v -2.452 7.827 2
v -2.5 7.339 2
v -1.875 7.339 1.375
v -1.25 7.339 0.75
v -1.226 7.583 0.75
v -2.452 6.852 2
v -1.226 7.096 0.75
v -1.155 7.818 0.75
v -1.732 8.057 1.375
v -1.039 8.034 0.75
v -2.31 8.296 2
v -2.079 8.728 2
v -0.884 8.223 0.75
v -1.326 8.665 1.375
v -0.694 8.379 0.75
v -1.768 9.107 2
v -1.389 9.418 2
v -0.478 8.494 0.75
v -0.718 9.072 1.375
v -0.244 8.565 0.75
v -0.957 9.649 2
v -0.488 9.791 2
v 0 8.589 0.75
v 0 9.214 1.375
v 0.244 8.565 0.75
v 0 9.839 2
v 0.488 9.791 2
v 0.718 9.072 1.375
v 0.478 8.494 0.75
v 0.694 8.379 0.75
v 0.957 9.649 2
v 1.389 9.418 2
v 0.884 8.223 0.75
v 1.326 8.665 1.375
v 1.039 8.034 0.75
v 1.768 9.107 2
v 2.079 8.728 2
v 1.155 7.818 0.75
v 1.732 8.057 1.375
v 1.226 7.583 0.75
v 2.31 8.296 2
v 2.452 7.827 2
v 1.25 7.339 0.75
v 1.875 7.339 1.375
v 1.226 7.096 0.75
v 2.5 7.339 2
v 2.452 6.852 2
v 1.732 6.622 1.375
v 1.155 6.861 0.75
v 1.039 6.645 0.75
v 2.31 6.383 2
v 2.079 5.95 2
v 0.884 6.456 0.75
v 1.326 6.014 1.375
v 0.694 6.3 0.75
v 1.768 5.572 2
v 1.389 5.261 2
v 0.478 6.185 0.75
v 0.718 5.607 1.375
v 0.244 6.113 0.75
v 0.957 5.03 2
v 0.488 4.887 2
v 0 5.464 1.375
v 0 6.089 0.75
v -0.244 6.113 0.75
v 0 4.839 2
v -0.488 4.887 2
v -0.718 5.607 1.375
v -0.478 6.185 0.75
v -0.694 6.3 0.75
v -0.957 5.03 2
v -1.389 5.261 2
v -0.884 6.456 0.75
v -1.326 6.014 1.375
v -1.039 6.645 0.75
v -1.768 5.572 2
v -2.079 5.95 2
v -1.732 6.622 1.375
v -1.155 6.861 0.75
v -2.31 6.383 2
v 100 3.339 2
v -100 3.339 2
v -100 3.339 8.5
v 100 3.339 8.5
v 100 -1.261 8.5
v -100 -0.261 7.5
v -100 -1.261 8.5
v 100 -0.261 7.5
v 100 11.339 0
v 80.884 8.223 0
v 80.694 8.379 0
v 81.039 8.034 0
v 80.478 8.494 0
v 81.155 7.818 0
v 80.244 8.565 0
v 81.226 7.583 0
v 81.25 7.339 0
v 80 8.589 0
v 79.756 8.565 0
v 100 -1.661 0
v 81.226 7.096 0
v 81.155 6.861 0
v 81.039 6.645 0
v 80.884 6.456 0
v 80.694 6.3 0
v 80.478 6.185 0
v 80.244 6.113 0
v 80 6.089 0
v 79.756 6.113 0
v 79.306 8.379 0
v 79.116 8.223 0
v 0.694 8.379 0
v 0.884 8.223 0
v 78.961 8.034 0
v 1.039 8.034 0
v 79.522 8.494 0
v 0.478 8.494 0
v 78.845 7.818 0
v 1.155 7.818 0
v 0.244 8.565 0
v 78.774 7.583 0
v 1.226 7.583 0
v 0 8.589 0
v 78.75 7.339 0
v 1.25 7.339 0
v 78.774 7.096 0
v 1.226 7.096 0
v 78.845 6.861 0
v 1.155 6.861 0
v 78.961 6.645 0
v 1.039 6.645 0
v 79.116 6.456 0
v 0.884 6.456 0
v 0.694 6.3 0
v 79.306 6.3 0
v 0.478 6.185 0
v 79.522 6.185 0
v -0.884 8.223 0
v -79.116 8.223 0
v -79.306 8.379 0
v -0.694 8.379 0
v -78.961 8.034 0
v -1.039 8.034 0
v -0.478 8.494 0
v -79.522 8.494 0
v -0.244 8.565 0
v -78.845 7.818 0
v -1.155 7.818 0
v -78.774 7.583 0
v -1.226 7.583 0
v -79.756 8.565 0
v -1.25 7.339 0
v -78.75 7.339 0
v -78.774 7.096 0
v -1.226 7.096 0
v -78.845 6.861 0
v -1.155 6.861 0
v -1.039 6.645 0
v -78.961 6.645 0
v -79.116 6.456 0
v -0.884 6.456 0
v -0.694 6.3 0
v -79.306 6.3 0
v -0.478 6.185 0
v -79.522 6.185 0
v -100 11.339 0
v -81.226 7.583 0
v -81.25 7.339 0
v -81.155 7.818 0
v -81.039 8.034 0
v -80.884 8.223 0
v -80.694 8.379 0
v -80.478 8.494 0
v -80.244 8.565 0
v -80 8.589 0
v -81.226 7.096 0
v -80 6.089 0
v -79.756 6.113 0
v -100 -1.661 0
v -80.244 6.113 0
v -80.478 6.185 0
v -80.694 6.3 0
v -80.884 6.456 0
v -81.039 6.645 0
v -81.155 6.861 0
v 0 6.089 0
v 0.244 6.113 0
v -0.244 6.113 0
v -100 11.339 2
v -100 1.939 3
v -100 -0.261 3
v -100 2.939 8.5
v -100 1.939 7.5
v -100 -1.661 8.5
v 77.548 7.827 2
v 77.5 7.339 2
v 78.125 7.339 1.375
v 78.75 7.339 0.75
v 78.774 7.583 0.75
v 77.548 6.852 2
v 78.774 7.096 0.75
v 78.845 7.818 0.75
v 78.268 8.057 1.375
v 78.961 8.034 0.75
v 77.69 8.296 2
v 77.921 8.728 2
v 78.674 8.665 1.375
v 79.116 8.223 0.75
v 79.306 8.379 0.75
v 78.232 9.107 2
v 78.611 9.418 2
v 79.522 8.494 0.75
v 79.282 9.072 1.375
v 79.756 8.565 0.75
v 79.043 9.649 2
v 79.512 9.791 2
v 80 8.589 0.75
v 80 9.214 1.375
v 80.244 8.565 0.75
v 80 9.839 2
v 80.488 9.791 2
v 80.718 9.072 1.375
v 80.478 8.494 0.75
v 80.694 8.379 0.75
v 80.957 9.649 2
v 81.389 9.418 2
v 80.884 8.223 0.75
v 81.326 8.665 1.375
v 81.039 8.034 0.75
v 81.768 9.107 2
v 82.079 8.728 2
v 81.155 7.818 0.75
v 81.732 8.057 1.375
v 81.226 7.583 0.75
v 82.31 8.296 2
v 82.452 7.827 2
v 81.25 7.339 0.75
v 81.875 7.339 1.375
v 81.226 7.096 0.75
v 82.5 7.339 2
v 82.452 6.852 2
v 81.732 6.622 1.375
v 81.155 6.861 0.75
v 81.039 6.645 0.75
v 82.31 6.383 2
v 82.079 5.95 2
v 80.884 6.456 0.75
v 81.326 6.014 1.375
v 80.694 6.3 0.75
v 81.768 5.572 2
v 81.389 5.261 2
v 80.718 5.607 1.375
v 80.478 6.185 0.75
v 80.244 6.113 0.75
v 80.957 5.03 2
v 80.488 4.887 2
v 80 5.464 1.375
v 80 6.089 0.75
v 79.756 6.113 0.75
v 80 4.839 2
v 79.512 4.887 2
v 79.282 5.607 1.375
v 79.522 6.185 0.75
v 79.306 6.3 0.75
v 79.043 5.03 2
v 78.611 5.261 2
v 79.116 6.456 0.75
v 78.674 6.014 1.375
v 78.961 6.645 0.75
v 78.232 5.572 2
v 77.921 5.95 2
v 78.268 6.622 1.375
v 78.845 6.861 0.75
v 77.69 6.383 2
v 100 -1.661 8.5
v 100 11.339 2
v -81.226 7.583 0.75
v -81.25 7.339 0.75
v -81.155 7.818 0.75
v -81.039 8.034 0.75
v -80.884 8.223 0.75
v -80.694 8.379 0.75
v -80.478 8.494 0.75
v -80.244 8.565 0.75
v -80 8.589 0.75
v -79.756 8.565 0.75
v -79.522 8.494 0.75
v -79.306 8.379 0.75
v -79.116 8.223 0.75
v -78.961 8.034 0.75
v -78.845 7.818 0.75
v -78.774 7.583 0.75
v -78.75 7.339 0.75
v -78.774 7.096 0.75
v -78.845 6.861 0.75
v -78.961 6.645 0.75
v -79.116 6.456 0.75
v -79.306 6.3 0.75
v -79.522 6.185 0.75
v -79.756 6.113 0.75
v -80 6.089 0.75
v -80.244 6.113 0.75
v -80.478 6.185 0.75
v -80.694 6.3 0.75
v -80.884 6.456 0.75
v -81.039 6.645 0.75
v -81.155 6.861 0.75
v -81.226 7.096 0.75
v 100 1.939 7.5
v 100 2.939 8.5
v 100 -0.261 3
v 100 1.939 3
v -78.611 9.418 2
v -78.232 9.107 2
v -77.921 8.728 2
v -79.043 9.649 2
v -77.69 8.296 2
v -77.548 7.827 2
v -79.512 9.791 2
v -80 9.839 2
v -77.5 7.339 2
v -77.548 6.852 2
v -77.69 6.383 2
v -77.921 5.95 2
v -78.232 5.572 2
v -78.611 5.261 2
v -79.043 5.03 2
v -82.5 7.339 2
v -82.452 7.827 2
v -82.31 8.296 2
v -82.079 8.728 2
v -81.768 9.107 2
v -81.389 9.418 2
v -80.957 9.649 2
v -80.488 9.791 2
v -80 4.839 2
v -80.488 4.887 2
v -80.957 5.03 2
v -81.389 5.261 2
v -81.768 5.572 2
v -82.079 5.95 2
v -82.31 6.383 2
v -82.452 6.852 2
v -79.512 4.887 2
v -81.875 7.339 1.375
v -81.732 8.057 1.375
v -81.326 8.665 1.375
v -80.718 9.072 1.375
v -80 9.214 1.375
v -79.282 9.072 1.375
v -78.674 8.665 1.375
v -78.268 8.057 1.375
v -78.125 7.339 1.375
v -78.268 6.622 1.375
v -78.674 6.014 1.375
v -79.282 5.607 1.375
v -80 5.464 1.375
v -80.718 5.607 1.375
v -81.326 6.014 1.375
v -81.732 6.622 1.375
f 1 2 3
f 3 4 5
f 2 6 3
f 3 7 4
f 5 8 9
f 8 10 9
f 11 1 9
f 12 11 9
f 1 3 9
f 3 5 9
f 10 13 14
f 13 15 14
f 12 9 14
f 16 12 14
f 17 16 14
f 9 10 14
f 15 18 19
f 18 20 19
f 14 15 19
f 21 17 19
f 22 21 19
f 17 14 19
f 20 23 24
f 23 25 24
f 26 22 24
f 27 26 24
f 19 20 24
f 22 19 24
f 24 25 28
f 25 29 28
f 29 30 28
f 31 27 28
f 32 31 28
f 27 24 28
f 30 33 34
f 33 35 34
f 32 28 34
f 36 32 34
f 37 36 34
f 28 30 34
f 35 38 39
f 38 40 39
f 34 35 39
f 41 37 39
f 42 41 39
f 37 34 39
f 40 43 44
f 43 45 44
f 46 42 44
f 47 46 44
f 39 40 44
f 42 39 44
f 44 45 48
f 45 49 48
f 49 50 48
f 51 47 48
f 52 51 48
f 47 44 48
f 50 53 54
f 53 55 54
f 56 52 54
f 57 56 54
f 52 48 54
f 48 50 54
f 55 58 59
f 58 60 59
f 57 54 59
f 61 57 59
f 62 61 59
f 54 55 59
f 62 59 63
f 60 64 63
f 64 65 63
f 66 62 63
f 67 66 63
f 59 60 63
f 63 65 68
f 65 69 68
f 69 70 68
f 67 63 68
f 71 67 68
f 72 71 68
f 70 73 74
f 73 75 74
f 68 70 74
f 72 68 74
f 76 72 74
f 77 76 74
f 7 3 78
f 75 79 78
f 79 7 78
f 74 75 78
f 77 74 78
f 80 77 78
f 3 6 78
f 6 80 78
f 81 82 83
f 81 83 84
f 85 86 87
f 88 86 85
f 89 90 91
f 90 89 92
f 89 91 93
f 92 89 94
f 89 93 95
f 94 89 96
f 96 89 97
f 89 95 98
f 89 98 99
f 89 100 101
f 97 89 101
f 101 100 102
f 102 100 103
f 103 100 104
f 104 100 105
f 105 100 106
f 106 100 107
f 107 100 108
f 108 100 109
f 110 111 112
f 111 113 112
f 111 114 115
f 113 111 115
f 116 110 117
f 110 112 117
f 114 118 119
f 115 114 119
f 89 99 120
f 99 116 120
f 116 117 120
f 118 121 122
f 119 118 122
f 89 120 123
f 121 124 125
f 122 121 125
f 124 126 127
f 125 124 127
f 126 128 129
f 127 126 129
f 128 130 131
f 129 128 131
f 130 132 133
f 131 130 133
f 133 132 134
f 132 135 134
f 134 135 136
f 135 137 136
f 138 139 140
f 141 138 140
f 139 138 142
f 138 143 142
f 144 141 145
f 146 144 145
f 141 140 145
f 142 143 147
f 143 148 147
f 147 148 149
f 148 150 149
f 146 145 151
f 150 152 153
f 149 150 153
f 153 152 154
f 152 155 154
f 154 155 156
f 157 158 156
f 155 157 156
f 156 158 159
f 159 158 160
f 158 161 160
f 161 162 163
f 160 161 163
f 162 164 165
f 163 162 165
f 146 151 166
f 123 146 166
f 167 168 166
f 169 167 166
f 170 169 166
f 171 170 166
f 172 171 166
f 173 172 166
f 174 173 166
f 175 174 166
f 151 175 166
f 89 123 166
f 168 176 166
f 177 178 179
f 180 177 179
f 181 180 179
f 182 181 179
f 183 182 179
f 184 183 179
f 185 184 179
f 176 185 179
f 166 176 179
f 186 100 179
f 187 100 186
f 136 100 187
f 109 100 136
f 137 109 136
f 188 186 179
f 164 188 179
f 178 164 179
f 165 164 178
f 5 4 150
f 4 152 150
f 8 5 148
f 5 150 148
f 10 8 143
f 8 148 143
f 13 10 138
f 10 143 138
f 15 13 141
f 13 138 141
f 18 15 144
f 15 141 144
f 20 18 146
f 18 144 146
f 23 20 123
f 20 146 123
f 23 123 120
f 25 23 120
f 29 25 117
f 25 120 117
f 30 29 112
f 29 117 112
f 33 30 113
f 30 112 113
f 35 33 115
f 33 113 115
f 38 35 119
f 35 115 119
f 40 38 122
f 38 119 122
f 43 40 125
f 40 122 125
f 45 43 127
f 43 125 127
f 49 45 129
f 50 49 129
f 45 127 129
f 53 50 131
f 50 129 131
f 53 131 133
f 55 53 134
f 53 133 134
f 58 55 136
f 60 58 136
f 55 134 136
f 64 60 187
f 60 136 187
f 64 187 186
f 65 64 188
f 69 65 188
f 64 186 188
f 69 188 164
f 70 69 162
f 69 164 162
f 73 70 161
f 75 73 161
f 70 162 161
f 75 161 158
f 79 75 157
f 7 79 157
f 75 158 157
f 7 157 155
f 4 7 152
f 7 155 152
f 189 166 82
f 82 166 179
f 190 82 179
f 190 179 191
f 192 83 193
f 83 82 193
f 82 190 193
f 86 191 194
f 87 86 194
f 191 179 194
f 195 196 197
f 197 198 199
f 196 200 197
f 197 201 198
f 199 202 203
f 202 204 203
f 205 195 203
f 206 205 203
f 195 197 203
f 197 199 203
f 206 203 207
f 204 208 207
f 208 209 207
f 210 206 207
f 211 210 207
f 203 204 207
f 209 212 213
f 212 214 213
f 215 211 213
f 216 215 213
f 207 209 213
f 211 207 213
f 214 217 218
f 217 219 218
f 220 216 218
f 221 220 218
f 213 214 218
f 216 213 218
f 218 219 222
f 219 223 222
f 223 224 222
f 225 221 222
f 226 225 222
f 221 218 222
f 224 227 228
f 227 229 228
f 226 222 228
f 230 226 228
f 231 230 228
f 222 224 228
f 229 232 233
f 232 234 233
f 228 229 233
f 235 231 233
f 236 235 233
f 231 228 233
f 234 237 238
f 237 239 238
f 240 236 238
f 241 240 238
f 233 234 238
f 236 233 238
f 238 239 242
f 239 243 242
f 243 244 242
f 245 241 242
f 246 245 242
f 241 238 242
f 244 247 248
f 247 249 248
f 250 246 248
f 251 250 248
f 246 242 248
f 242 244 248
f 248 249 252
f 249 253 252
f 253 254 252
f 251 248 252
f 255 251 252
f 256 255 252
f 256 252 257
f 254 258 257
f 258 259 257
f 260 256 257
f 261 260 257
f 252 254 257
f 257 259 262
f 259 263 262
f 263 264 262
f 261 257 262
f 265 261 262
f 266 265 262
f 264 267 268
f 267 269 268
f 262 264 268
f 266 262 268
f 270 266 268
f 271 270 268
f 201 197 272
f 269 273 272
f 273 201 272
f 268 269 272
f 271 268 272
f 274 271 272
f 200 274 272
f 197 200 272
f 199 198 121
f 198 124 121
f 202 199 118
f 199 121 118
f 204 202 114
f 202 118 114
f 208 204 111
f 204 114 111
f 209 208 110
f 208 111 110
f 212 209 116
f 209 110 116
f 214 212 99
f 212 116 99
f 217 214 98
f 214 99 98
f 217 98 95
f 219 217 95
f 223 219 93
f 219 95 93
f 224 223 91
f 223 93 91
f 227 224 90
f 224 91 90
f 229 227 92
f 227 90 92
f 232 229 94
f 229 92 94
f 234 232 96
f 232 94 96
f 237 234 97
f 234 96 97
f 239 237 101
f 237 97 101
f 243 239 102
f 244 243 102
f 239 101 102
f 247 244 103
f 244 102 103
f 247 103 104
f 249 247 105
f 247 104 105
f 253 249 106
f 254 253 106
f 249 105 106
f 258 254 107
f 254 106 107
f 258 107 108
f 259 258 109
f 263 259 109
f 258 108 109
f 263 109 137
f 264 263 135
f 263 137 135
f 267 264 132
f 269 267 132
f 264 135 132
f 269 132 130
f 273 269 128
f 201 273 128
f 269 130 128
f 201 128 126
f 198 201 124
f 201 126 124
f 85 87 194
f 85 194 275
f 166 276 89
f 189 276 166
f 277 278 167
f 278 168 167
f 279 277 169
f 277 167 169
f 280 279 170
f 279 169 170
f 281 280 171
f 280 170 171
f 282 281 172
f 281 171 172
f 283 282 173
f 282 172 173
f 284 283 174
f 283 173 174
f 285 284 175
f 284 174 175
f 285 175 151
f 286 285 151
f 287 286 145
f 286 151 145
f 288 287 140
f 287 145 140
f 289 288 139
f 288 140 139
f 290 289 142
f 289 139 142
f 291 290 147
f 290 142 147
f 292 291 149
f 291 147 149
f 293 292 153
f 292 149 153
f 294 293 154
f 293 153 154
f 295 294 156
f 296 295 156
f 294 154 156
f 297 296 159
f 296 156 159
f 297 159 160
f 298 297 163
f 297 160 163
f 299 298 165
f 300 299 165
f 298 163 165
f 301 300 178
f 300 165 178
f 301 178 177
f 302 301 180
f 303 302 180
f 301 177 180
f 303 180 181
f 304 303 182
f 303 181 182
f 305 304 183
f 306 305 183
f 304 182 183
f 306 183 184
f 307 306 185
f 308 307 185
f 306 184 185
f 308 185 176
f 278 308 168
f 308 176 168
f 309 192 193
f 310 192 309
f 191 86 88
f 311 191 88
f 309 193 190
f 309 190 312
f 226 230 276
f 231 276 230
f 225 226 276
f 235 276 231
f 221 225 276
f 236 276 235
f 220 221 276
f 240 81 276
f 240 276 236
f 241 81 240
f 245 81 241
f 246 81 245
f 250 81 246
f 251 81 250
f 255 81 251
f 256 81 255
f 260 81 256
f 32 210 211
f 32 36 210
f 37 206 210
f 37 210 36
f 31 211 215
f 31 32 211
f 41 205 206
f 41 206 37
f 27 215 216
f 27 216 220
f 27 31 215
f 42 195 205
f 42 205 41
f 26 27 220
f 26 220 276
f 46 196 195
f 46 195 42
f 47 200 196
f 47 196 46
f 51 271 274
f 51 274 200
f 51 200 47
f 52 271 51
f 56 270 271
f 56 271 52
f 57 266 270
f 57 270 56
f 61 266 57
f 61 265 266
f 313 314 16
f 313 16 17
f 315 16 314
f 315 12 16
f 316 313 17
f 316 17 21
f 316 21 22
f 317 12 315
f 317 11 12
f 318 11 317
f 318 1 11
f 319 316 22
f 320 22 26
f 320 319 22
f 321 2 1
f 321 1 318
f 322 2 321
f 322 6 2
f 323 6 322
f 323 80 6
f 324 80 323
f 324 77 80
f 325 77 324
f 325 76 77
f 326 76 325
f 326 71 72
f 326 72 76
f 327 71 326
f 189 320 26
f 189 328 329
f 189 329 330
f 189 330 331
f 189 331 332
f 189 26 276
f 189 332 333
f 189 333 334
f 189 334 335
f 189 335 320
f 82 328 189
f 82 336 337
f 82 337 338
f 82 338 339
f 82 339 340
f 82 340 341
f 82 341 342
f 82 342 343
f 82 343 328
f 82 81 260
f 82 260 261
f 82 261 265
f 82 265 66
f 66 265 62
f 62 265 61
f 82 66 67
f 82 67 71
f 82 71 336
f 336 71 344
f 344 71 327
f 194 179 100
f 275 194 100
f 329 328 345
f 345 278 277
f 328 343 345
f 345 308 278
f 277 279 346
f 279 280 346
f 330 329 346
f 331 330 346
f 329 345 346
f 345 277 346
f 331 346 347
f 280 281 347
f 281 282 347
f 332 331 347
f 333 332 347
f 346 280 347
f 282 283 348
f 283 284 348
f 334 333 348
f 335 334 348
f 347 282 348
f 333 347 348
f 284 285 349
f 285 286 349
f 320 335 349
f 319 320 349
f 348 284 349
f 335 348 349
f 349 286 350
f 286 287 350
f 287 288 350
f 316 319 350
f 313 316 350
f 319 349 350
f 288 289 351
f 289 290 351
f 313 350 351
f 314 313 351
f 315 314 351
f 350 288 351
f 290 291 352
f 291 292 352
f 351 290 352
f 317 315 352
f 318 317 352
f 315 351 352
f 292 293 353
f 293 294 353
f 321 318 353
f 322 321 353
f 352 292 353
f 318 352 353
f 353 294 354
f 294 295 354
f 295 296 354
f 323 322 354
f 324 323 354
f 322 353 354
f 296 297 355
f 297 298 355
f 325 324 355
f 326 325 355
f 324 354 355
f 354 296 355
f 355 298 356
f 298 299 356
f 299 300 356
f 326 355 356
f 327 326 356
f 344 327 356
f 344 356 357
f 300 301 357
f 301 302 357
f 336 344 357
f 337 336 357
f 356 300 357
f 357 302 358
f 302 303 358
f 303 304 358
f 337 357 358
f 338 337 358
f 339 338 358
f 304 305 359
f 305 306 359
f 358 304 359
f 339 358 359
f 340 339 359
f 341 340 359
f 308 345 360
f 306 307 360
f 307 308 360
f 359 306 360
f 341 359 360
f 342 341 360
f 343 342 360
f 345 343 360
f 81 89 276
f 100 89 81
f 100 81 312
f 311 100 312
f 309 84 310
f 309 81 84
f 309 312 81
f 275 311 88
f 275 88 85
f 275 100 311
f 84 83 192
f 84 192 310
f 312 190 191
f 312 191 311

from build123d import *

# Parameters (mm, degrees)
F0_W           = 200
F0_H           = 5
F1_DEPTH       = 8.5
F2_W           = 200
F2_H           = 2.2
F3_DEPTH       = 5.5
F4_W           = 200
F4_H           = 2
F5_DEPTH       = 8
F7_D           = 2.5
F7_CSINK_D     = 5
F7_CSINK_ANGLE = 90
F8_SIZE        = 1


with BuildPart() as f1:
    # F0 (on Top) → F1 (new body)
    with BuildSketch(Plane.XY):
        with Locations((0, 0.839391)):
            Rectangle(F0_W, F0_H)
    extrude(amount=F1_DEPTH)

    # F2 (on face) → F3 (cut)
    with BuildSketch(Plane.XY.offset(8.5)):
        with Locations((0, 0.839391)):
            Rectangle(F2_W, F2_H)
    extrude(amount=-F3_DEPTH, mode=Mode.SUBTRACT)

    # F4 (on face) → F5 (join)
    with BuildSketch(Plane(origin=(0, 3.339391, 0), x_dir=(-1, 0, 0), z_dir=(0, 1, 0))):
        with Locations((0, 1)):
            Rectangle(F4_W, F4_H)
    extrude(amount=F5_DEPTH)

    # F7 (through all)
    with Locations(Plane.XY.offset(2)):
        with Locations((0, 7.339391), (80, 7.339391), (-80, 7.339391)):
            CounterSinkHole(F7_D / 2, F7_CSINK_D / 2, counter_sink_angle=F7_CSINK_ANGLE)

    # F8
    f8_edges = [f1.edges().sort_by_distance(p)[0] for p in [
        (0, 1.939391, 8.5),
        (0, -0.260609, 8.5),
    ]]
    chamfer(f8_edges, length=F8_SIZE)


solid = f1.part
